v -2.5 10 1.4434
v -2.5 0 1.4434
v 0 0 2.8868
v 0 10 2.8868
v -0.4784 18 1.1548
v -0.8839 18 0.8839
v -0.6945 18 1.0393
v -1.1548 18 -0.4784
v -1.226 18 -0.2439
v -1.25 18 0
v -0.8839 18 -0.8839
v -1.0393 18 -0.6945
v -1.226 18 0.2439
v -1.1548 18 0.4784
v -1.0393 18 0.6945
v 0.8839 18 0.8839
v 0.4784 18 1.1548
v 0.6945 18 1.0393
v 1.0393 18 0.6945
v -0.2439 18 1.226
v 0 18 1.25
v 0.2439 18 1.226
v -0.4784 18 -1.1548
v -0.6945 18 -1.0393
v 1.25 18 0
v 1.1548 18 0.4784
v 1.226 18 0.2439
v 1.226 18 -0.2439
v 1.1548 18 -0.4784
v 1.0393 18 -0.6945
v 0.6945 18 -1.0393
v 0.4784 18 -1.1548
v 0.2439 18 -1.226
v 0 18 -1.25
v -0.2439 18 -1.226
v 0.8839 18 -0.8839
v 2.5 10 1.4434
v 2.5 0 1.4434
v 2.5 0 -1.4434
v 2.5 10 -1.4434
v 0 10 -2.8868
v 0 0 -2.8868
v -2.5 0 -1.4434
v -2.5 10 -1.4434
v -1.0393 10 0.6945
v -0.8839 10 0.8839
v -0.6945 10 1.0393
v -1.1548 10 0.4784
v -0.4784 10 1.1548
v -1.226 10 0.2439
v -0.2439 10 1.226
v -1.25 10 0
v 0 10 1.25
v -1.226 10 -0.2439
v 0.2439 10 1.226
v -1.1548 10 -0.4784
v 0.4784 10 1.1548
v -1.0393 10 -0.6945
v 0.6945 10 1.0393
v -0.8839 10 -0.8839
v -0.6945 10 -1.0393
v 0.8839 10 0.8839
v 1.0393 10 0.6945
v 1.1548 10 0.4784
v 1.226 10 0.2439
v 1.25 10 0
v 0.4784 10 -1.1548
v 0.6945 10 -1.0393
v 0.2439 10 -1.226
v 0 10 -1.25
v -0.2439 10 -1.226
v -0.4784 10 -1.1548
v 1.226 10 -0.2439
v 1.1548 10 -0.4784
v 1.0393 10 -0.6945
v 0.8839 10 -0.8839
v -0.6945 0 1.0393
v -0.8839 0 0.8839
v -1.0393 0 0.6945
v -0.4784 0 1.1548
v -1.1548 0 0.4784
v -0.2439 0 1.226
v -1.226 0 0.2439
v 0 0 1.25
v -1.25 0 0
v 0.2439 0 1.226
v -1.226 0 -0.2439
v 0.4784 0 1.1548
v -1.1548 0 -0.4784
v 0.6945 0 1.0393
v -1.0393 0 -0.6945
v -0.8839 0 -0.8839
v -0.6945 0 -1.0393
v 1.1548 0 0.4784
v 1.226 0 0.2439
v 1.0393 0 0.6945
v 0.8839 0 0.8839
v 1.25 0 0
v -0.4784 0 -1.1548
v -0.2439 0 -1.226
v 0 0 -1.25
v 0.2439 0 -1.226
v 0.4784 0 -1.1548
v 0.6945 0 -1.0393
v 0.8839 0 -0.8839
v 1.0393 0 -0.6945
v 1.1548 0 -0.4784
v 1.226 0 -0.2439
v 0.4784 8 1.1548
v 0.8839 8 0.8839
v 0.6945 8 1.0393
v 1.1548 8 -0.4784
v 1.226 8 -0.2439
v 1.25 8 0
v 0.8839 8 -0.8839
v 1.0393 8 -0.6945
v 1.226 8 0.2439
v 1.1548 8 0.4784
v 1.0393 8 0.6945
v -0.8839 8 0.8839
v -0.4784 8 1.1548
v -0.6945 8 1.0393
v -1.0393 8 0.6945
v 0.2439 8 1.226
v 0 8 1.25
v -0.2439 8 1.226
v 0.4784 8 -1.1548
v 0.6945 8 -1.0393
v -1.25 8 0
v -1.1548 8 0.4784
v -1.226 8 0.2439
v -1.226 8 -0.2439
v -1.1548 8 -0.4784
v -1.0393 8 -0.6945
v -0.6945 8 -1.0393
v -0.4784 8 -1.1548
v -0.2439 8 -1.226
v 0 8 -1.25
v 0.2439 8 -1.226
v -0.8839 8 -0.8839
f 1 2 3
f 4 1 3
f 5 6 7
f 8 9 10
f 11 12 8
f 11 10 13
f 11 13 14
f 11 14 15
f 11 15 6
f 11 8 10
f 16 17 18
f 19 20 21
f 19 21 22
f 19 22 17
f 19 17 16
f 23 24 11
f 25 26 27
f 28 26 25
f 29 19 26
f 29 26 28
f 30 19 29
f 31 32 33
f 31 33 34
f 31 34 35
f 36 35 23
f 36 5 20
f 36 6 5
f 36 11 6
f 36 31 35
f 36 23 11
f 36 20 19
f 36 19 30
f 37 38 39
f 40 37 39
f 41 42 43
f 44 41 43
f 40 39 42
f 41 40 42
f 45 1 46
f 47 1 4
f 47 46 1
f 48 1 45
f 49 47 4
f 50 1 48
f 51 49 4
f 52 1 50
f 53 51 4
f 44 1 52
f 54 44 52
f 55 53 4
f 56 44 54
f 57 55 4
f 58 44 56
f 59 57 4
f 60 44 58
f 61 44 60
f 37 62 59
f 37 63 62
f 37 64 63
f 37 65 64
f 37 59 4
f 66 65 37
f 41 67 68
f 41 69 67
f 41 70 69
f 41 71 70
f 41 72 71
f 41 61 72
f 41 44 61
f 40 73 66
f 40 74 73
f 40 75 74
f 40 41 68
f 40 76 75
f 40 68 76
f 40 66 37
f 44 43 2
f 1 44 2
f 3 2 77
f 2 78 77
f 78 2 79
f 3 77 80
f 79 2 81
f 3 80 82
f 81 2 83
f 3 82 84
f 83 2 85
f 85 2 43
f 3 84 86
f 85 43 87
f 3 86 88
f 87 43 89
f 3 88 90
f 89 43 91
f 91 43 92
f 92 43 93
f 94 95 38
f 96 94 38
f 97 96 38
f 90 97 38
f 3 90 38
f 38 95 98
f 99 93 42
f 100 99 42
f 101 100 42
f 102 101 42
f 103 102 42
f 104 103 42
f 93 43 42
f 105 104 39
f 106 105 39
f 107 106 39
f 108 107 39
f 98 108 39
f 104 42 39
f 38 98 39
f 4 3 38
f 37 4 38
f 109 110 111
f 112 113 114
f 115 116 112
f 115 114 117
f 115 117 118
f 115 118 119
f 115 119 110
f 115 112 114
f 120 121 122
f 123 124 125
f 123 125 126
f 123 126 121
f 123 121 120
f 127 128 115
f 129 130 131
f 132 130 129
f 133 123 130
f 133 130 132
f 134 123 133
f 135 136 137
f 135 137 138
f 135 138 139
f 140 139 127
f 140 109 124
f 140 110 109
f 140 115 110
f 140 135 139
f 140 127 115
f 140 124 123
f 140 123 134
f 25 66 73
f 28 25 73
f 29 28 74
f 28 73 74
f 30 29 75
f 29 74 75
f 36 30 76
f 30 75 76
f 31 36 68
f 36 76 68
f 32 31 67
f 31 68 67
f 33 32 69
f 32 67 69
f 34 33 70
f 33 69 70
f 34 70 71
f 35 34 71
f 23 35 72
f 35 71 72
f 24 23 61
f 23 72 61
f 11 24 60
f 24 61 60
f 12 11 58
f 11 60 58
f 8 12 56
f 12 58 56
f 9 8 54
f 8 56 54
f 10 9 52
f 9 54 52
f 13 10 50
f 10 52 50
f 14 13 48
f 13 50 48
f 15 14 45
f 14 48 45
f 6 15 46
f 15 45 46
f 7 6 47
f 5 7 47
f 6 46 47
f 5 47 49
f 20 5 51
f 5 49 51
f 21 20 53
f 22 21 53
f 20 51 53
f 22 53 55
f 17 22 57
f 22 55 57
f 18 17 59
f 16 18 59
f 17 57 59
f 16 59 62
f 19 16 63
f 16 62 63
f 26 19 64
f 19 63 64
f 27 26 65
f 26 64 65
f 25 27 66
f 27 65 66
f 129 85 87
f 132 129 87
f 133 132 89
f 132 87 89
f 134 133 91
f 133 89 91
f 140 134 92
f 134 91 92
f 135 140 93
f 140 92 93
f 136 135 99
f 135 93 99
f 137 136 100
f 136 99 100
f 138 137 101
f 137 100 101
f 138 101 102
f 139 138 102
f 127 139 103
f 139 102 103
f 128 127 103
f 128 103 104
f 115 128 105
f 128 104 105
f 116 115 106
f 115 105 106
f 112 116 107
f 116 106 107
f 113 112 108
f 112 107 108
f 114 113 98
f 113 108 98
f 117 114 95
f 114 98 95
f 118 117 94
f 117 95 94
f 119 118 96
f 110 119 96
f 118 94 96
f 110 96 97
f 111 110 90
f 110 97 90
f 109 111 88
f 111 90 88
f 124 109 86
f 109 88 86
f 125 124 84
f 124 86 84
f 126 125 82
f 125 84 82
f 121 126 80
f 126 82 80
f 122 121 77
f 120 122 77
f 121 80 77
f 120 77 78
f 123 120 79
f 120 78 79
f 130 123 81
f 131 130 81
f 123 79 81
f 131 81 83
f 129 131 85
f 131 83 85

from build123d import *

# Parameters (mm, degrees)
BOSS_EXTRUDE1_DEPTH = 10
SKETCH2_R           = 1.25
BOSS_EXTRUDE2_DEPTH = 8
SKETCH3_R           = 1.25
CUT_EXTRUDE1_DEPTH  = 8


with BuildPart() as part:
    # Sketch1 → Boss-Extrude1 (new body)
    with BuildSketch(Plane(origin=(0, 0, 0), x_dir=(1, 0, 0), z_dir=(0, 1, 0))):
        Polygon((0, 2.886751346), (-2.5, 1.443375673), (-2.5, -1.443375673), (0, -2.886751346), (2.5, -1.443375673), (2.5, 1.443375673), align=None)
    extrude(amount=BOSS_EXTRUDE1_DEPTH)

    # Sketch2 → Boss-Extrude2 (add)
    with BuildSketch(Plane(origin=(0, 10, 0), x_dir=(1, 0, 0), z_dir=(0, 1, 0))):
        Circle(SKETCH2_R)
    extrude(amount=BOSS_EXTRUDE2_DEPTH)

    # Sketch3 → Cut-Extrude1 (cut)
    with BuildSketch(Plane(origin=(0, 0, 0), x_dir=(-1, 0, 0), z_dir=(0, -1, 0))):
        Circle(SKETCH3_R)
    extrude(amount=-CUT_EXTRUDE1_DEPTH, mode=Mode.SUBTRACT)


solid = part.part
